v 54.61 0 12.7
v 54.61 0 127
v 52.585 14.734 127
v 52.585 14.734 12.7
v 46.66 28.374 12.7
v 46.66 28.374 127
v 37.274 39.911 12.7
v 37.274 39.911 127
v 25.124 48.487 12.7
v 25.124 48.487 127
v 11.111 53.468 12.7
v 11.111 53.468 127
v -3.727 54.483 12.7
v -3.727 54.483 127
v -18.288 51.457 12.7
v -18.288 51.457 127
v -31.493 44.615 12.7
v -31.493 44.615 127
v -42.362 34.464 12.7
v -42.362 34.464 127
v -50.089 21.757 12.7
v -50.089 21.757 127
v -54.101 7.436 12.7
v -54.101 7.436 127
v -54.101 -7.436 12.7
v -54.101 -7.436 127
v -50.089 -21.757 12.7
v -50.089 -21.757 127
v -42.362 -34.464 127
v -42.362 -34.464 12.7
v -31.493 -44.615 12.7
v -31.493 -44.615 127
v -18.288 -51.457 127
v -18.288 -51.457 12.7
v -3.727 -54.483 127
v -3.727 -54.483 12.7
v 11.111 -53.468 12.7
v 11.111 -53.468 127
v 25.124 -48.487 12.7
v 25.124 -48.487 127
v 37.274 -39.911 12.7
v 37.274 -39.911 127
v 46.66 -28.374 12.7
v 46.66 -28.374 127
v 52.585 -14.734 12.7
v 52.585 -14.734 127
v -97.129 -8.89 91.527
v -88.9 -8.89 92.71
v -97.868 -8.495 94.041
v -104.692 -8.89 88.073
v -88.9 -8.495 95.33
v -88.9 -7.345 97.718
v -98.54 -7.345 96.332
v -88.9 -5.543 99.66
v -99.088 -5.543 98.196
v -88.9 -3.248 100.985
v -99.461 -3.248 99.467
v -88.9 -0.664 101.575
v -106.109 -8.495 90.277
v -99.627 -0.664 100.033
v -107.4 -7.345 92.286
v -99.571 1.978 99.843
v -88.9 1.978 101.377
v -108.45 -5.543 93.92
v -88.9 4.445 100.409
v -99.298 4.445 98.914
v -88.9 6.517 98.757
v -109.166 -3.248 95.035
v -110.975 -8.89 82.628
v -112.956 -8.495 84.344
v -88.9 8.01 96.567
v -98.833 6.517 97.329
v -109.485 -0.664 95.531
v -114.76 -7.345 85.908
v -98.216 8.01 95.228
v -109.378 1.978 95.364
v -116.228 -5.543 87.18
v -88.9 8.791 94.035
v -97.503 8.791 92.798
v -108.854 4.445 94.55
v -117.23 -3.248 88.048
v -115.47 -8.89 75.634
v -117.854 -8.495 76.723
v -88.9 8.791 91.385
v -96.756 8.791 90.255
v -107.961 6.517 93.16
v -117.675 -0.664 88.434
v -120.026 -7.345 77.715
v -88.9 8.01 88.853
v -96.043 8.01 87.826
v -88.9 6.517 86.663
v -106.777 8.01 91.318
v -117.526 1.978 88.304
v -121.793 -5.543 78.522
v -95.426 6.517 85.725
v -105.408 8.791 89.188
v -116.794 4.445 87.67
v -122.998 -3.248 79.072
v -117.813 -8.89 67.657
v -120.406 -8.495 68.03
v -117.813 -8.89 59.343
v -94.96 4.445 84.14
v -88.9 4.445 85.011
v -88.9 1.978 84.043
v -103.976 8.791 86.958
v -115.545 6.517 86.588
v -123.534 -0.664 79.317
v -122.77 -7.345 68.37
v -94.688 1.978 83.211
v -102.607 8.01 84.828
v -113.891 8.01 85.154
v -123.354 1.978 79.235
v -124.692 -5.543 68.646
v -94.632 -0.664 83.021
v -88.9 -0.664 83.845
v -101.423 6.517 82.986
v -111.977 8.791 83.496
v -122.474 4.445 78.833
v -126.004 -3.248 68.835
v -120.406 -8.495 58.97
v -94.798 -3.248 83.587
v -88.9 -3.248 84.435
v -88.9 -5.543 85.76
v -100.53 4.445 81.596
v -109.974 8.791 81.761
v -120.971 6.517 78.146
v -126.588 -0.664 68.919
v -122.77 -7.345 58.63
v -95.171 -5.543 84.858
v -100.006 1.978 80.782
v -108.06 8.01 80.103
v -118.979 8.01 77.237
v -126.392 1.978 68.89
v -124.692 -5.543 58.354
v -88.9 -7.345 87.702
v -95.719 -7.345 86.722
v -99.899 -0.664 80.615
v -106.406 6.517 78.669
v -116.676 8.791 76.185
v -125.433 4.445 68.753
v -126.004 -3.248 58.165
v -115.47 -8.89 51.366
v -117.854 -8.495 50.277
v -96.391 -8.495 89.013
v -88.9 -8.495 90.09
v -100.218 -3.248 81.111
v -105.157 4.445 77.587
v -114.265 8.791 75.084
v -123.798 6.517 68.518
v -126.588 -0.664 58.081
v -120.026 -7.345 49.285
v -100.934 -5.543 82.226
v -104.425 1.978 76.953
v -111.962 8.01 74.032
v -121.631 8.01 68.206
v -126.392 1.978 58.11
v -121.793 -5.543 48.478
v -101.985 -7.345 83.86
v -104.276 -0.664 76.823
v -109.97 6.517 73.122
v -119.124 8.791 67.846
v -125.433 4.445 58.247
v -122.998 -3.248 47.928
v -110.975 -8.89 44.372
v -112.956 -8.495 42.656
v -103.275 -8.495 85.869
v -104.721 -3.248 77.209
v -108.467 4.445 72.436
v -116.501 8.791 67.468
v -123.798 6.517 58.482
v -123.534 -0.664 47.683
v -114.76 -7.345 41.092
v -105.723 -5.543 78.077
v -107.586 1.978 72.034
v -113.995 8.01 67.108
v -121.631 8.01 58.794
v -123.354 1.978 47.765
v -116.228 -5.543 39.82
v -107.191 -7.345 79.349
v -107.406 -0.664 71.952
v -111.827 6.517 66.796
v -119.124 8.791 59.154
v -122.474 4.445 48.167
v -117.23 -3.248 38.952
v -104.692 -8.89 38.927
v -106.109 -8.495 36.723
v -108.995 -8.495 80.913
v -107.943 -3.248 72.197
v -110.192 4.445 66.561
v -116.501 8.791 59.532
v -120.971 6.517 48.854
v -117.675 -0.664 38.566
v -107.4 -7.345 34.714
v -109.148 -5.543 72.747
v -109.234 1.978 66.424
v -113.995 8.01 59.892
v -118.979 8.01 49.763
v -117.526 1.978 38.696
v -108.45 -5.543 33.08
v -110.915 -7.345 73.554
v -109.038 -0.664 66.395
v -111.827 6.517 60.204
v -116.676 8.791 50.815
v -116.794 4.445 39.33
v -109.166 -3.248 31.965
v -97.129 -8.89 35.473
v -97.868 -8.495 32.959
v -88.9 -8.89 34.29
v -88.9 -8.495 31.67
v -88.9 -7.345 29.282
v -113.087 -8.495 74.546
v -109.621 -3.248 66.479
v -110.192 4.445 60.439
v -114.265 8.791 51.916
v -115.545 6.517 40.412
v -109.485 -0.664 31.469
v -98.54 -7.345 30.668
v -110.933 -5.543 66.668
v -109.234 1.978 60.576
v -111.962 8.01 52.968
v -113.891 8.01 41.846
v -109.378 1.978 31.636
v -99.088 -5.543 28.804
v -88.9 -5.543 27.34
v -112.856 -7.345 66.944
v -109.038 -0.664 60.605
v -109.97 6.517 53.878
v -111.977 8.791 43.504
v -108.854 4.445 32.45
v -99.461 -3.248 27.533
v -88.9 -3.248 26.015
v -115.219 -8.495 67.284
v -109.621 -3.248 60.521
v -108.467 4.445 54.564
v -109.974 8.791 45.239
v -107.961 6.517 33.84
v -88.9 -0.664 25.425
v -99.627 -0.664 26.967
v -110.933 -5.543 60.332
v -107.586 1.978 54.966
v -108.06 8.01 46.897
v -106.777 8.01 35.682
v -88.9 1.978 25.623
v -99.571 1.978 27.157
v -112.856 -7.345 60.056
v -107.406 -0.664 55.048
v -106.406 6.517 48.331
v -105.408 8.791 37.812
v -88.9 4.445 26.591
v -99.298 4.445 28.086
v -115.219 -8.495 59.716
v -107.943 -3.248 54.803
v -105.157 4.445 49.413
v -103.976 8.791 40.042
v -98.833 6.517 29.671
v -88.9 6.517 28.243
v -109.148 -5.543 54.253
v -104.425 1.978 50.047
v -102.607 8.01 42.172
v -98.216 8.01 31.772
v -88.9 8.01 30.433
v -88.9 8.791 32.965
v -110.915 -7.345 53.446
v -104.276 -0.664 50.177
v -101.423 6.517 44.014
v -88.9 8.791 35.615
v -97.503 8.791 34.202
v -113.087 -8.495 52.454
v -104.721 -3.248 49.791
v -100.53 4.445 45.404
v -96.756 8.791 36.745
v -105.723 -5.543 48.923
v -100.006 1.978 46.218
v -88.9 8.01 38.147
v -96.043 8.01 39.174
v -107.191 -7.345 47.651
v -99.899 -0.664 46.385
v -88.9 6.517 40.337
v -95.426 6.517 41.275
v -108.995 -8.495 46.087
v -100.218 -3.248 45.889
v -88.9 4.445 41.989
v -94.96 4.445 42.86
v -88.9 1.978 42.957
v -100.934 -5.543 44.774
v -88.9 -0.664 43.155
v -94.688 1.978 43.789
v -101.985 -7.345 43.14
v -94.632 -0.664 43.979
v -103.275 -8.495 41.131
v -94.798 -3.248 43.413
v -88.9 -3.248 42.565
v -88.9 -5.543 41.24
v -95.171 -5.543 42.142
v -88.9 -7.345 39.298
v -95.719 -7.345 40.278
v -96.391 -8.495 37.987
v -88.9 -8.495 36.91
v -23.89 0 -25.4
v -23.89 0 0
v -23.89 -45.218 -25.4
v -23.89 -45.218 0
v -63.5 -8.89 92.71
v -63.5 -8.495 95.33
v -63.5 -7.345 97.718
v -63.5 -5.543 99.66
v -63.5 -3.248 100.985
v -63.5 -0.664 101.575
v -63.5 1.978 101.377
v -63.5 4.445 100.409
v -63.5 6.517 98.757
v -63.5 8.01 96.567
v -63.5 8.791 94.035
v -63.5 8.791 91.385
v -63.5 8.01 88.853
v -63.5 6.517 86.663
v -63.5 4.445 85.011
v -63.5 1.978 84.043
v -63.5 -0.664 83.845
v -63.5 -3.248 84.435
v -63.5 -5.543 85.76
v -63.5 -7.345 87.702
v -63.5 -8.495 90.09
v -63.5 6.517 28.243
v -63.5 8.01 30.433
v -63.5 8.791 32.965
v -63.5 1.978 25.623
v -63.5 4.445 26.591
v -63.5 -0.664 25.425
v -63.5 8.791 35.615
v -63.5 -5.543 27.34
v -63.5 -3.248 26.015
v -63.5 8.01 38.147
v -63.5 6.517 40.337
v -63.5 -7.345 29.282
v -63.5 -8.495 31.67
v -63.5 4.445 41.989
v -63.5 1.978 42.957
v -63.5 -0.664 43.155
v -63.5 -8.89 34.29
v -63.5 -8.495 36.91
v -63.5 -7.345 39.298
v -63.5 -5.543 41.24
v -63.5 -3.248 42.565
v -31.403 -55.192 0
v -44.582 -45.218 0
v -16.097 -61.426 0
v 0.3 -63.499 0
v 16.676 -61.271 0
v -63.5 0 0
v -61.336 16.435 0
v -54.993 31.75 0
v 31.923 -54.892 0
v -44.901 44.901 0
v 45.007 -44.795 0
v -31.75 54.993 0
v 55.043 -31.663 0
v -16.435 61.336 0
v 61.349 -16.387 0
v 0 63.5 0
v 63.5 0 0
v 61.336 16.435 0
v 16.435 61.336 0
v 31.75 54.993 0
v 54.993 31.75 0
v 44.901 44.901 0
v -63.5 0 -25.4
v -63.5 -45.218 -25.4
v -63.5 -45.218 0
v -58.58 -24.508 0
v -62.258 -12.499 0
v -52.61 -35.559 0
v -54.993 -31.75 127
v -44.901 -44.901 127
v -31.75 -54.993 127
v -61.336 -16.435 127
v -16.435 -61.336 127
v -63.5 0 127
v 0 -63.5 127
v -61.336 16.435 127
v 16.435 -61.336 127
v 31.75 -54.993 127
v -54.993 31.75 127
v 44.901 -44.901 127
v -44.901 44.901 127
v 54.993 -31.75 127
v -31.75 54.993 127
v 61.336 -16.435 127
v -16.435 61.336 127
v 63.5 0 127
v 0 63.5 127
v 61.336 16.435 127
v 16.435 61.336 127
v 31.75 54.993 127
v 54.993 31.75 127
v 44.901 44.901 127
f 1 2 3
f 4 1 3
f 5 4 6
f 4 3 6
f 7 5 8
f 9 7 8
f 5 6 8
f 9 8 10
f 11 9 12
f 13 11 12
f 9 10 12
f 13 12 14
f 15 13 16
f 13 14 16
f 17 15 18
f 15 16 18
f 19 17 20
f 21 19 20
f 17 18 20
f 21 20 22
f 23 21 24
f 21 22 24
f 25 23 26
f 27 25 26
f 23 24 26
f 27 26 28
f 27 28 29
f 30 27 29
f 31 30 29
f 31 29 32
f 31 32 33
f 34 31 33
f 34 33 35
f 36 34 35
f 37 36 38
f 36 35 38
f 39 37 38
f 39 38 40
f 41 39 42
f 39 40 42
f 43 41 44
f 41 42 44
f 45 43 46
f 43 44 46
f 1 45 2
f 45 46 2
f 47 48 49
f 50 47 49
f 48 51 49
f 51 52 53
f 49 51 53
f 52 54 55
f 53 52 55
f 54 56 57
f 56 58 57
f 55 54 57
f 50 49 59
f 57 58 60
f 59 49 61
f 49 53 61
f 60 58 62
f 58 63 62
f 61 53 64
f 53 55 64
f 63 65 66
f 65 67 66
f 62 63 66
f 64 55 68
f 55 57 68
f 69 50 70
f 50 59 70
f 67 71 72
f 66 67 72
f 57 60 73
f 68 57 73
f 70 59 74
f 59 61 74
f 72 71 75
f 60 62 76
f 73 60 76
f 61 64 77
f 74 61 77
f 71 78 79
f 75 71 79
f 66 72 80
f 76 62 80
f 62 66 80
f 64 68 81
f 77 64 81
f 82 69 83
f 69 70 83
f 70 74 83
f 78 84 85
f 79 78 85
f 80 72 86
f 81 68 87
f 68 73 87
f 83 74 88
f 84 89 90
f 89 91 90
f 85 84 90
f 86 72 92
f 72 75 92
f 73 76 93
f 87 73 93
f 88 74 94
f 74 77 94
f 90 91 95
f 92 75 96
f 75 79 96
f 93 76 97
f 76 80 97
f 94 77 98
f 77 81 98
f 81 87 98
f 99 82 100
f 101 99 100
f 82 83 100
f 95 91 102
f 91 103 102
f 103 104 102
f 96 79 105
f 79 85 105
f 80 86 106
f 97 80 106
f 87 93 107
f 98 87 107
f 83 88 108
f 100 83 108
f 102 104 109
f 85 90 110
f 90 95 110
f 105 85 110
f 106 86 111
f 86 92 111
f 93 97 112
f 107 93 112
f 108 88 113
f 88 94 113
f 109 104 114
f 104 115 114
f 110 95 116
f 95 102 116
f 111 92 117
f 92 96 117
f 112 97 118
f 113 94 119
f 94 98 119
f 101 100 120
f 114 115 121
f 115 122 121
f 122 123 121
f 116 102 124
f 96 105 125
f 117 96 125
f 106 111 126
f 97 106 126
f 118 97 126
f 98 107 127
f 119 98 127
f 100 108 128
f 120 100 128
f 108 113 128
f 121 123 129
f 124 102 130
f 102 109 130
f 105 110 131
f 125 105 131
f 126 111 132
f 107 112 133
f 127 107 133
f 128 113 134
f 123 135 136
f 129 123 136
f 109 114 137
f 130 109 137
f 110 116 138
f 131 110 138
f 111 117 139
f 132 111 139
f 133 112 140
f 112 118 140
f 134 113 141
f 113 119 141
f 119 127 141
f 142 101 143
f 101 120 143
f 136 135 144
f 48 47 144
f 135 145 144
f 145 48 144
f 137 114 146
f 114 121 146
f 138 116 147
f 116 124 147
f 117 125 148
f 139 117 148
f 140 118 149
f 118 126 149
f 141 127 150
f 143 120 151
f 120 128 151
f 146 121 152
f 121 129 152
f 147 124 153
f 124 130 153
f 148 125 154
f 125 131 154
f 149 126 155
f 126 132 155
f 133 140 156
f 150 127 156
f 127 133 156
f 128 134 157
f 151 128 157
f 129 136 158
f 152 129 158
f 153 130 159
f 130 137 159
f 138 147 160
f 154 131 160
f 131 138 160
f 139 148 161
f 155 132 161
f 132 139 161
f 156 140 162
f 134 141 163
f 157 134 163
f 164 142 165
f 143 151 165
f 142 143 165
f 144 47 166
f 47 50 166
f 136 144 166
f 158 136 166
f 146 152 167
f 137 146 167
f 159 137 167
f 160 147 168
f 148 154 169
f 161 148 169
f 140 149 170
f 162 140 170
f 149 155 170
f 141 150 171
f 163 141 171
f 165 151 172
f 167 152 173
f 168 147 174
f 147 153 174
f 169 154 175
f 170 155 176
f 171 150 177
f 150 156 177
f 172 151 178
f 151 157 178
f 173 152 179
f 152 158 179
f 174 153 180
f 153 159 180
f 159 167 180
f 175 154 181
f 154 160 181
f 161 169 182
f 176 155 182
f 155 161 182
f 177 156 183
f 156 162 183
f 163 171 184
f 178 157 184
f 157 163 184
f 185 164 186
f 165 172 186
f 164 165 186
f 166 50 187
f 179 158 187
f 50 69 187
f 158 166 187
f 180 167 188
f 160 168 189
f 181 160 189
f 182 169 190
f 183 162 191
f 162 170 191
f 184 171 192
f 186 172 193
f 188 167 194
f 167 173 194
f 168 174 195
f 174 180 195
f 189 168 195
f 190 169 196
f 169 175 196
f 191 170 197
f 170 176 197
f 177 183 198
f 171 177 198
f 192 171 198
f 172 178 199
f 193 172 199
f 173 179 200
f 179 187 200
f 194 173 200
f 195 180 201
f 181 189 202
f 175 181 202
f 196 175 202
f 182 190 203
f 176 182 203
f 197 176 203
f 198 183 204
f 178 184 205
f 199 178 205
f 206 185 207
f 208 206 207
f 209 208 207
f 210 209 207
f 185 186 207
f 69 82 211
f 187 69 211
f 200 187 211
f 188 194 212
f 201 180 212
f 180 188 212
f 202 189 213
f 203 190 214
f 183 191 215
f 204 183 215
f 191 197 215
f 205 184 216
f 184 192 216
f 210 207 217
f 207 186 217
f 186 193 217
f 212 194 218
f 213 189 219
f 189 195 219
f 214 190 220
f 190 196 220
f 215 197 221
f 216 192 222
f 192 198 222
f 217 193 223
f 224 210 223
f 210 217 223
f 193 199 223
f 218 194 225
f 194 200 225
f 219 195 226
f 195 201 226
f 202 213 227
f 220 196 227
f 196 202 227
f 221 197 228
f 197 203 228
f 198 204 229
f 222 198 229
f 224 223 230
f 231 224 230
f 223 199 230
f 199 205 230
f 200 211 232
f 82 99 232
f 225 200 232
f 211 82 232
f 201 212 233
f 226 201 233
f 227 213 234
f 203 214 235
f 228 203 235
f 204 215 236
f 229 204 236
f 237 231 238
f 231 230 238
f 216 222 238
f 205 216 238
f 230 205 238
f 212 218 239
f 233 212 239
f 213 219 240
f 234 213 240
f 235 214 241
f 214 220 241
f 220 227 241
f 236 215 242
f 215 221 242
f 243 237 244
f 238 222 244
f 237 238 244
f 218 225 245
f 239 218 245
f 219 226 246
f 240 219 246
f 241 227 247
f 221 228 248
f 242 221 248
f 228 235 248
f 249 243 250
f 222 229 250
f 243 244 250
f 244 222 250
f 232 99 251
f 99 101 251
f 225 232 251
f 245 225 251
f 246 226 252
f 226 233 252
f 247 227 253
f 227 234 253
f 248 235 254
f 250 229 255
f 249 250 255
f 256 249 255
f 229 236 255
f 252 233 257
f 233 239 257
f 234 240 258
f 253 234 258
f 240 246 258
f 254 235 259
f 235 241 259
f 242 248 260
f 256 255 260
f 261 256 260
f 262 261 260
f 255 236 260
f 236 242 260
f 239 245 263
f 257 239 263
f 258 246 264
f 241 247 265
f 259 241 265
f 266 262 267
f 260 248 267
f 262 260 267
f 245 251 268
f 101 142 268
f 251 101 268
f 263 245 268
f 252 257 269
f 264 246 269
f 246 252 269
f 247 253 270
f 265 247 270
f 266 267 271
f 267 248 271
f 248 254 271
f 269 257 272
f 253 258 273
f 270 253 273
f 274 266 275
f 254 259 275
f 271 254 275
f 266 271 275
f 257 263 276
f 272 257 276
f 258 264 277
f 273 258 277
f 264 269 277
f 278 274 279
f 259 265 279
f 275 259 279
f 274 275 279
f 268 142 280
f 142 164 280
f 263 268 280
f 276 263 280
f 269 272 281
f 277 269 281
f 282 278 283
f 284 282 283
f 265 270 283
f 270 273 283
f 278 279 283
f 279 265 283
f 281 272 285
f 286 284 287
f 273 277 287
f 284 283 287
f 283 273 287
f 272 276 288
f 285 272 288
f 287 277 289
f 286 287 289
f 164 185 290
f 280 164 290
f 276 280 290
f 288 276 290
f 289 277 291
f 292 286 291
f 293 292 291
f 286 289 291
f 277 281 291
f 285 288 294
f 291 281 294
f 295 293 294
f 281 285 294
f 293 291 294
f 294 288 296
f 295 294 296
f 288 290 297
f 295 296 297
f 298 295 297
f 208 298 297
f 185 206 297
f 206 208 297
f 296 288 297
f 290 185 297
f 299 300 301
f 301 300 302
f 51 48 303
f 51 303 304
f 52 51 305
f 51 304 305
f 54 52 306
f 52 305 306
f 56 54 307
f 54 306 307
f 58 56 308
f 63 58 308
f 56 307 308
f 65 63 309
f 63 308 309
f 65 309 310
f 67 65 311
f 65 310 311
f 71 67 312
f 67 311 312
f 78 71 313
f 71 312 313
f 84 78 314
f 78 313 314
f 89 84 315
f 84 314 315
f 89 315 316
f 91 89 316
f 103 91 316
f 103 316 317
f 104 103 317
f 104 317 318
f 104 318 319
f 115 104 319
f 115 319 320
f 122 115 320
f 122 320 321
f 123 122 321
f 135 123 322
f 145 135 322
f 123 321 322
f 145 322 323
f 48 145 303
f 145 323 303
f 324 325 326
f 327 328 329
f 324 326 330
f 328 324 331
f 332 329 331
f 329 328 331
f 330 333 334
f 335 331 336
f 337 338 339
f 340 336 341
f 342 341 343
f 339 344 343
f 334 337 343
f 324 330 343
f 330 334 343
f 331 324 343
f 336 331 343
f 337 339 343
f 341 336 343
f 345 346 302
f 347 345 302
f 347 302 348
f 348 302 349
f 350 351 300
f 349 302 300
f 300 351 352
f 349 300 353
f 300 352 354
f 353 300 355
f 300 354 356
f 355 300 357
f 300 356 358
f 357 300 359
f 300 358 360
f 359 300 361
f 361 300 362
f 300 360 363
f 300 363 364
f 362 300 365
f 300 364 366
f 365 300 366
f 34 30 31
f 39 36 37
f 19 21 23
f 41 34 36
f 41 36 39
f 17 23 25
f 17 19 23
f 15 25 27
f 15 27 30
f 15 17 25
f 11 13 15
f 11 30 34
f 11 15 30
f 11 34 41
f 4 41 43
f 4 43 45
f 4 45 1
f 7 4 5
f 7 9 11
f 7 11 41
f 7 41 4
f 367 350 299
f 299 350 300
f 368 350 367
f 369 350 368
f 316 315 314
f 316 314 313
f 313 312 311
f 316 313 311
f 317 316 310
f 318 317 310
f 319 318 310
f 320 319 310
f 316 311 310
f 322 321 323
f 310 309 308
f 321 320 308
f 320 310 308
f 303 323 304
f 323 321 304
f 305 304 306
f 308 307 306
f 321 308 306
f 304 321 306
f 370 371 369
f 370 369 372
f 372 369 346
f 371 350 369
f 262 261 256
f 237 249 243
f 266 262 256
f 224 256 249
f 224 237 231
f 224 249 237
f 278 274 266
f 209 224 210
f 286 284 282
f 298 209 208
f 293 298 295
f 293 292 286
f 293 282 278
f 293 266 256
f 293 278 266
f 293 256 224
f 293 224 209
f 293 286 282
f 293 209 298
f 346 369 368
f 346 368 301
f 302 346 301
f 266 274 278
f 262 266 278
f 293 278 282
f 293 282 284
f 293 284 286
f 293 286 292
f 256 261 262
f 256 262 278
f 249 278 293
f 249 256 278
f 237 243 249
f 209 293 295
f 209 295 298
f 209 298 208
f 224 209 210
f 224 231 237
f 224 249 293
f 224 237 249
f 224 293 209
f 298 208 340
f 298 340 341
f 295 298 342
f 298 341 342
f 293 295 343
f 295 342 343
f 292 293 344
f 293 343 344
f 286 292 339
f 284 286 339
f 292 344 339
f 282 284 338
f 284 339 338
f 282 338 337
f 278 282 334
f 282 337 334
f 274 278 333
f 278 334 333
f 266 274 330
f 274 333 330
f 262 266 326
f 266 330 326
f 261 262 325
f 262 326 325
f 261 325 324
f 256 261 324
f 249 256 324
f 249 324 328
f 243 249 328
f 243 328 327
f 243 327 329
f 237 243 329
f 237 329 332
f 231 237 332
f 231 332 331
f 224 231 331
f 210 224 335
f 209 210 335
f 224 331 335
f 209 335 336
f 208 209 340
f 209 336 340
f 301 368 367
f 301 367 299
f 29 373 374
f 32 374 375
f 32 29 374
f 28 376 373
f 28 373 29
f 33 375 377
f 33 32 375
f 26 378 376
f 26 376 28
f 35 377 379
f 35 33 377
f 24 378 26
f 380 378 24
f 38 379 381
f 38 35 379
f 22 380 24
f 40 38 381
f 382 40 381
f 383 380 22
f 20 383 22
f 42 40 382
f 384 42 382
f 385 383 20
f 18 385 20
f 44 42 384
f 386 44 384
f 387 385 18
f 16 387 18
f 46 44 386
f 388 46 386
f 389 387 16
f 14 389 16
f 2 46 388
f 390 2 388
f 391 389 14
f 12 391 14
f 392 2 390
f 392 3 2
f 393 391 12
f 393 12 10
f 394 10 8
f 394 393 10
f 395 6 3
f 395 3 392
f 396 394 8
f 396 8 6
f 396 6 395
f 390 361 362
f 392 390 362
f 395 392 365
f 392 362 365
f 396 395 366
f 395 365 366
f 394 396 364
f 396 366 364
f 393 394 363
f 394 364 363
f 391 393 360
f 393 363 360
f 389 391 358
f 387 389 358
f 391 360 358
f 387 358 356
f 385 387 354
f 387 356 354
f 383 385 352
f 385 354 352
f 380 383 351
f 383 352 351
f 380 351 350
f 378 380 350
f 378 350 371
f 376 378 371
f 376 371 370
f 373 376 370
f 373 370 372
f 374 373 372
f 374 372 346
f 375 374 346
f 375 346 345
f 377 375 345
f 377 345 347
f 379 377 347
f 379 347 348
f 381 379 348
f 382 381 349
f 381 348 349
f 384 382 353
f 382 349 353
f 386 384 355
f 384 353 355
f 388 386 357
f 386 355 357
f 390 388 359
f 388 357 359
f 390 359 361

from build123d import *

# Parameters (mm, degrees)
F0_R     = 63.5
F1_DEPTH = 127
F2_R     = 54.61
F3_DEPTH = 114.3
F4_W     = 39.6098716408
F4_H     = 45.2183522284
F5_DEPTH = 25.4
F6_R     = 8.89
F7_DEPTH = 25.4
F8_R     = 8.89
F9_ANGLE = 180


with BuildPart() as f1:
    # F0 (on Top) → F1 (new body)
    with BuildSketch(Plane.XY):
        Circle(F0_R)
    extrude(amount=F1_DEPTH)

    # F2 (on face) → F3 (cut)
    with BuildSketch(Plane.XY.offset(127)):
        Circle(F2_R)
    extrude(amount=-F3_DEPTH, mode=Mode.SUBTRACT)

    # F4 (on face) → F5 (join)
    with BuildSketch(Plane(origin=(0, 0, 0), x_dir=(1, 0, 0), z_dir=(0, 0, -1))):
        with Locations((-43.6950641796, 22.6091761142)):
            Rectangle(F4_W, F4_H)
    extrude(amount=F5_DEPTH)


with BuildPart() as f7:
    # F6 (on face) → F7 (new body)
    with BuildSketch(Plane(origin=(-63.5, 0, 0), x_dir=(0, -1, 0), z_dir=(-1, 0, 0))):
        with Locations((0, 92.71)):
            Circle(F6_R)
    extrude(amount=F7_DEPTH)

    # F8 (on face) → F9 (revolve)
    with BuildSketch(Plane(origin=(-88.9, 0, 0), x_dir=(0, -1, 0), z_dir=(-1, 0, 0))):
        with Locations((0, 92.71)):
            Circle(F8_R)
    revolve(axis=Axis((-88.9, 0.4127491266, 63.5), (0, -1, 0)), revolution_arc=F9_ANGLE)


with BuildPart() as f7b:
    # F6 (on face) → F7, piece 2 (new body)
    with BuildSketch(Plane(origin=(-63.5, 0, 0), x_dir=(0, -1, 0), z_dir=(-1, 0, 0))):
        with Locations((0, 34.29)):
            Circle(F6_R)
    extrude(amount=F7_DEPTH)


solid = Compound([f1.part, f7.part, f7b.part])
